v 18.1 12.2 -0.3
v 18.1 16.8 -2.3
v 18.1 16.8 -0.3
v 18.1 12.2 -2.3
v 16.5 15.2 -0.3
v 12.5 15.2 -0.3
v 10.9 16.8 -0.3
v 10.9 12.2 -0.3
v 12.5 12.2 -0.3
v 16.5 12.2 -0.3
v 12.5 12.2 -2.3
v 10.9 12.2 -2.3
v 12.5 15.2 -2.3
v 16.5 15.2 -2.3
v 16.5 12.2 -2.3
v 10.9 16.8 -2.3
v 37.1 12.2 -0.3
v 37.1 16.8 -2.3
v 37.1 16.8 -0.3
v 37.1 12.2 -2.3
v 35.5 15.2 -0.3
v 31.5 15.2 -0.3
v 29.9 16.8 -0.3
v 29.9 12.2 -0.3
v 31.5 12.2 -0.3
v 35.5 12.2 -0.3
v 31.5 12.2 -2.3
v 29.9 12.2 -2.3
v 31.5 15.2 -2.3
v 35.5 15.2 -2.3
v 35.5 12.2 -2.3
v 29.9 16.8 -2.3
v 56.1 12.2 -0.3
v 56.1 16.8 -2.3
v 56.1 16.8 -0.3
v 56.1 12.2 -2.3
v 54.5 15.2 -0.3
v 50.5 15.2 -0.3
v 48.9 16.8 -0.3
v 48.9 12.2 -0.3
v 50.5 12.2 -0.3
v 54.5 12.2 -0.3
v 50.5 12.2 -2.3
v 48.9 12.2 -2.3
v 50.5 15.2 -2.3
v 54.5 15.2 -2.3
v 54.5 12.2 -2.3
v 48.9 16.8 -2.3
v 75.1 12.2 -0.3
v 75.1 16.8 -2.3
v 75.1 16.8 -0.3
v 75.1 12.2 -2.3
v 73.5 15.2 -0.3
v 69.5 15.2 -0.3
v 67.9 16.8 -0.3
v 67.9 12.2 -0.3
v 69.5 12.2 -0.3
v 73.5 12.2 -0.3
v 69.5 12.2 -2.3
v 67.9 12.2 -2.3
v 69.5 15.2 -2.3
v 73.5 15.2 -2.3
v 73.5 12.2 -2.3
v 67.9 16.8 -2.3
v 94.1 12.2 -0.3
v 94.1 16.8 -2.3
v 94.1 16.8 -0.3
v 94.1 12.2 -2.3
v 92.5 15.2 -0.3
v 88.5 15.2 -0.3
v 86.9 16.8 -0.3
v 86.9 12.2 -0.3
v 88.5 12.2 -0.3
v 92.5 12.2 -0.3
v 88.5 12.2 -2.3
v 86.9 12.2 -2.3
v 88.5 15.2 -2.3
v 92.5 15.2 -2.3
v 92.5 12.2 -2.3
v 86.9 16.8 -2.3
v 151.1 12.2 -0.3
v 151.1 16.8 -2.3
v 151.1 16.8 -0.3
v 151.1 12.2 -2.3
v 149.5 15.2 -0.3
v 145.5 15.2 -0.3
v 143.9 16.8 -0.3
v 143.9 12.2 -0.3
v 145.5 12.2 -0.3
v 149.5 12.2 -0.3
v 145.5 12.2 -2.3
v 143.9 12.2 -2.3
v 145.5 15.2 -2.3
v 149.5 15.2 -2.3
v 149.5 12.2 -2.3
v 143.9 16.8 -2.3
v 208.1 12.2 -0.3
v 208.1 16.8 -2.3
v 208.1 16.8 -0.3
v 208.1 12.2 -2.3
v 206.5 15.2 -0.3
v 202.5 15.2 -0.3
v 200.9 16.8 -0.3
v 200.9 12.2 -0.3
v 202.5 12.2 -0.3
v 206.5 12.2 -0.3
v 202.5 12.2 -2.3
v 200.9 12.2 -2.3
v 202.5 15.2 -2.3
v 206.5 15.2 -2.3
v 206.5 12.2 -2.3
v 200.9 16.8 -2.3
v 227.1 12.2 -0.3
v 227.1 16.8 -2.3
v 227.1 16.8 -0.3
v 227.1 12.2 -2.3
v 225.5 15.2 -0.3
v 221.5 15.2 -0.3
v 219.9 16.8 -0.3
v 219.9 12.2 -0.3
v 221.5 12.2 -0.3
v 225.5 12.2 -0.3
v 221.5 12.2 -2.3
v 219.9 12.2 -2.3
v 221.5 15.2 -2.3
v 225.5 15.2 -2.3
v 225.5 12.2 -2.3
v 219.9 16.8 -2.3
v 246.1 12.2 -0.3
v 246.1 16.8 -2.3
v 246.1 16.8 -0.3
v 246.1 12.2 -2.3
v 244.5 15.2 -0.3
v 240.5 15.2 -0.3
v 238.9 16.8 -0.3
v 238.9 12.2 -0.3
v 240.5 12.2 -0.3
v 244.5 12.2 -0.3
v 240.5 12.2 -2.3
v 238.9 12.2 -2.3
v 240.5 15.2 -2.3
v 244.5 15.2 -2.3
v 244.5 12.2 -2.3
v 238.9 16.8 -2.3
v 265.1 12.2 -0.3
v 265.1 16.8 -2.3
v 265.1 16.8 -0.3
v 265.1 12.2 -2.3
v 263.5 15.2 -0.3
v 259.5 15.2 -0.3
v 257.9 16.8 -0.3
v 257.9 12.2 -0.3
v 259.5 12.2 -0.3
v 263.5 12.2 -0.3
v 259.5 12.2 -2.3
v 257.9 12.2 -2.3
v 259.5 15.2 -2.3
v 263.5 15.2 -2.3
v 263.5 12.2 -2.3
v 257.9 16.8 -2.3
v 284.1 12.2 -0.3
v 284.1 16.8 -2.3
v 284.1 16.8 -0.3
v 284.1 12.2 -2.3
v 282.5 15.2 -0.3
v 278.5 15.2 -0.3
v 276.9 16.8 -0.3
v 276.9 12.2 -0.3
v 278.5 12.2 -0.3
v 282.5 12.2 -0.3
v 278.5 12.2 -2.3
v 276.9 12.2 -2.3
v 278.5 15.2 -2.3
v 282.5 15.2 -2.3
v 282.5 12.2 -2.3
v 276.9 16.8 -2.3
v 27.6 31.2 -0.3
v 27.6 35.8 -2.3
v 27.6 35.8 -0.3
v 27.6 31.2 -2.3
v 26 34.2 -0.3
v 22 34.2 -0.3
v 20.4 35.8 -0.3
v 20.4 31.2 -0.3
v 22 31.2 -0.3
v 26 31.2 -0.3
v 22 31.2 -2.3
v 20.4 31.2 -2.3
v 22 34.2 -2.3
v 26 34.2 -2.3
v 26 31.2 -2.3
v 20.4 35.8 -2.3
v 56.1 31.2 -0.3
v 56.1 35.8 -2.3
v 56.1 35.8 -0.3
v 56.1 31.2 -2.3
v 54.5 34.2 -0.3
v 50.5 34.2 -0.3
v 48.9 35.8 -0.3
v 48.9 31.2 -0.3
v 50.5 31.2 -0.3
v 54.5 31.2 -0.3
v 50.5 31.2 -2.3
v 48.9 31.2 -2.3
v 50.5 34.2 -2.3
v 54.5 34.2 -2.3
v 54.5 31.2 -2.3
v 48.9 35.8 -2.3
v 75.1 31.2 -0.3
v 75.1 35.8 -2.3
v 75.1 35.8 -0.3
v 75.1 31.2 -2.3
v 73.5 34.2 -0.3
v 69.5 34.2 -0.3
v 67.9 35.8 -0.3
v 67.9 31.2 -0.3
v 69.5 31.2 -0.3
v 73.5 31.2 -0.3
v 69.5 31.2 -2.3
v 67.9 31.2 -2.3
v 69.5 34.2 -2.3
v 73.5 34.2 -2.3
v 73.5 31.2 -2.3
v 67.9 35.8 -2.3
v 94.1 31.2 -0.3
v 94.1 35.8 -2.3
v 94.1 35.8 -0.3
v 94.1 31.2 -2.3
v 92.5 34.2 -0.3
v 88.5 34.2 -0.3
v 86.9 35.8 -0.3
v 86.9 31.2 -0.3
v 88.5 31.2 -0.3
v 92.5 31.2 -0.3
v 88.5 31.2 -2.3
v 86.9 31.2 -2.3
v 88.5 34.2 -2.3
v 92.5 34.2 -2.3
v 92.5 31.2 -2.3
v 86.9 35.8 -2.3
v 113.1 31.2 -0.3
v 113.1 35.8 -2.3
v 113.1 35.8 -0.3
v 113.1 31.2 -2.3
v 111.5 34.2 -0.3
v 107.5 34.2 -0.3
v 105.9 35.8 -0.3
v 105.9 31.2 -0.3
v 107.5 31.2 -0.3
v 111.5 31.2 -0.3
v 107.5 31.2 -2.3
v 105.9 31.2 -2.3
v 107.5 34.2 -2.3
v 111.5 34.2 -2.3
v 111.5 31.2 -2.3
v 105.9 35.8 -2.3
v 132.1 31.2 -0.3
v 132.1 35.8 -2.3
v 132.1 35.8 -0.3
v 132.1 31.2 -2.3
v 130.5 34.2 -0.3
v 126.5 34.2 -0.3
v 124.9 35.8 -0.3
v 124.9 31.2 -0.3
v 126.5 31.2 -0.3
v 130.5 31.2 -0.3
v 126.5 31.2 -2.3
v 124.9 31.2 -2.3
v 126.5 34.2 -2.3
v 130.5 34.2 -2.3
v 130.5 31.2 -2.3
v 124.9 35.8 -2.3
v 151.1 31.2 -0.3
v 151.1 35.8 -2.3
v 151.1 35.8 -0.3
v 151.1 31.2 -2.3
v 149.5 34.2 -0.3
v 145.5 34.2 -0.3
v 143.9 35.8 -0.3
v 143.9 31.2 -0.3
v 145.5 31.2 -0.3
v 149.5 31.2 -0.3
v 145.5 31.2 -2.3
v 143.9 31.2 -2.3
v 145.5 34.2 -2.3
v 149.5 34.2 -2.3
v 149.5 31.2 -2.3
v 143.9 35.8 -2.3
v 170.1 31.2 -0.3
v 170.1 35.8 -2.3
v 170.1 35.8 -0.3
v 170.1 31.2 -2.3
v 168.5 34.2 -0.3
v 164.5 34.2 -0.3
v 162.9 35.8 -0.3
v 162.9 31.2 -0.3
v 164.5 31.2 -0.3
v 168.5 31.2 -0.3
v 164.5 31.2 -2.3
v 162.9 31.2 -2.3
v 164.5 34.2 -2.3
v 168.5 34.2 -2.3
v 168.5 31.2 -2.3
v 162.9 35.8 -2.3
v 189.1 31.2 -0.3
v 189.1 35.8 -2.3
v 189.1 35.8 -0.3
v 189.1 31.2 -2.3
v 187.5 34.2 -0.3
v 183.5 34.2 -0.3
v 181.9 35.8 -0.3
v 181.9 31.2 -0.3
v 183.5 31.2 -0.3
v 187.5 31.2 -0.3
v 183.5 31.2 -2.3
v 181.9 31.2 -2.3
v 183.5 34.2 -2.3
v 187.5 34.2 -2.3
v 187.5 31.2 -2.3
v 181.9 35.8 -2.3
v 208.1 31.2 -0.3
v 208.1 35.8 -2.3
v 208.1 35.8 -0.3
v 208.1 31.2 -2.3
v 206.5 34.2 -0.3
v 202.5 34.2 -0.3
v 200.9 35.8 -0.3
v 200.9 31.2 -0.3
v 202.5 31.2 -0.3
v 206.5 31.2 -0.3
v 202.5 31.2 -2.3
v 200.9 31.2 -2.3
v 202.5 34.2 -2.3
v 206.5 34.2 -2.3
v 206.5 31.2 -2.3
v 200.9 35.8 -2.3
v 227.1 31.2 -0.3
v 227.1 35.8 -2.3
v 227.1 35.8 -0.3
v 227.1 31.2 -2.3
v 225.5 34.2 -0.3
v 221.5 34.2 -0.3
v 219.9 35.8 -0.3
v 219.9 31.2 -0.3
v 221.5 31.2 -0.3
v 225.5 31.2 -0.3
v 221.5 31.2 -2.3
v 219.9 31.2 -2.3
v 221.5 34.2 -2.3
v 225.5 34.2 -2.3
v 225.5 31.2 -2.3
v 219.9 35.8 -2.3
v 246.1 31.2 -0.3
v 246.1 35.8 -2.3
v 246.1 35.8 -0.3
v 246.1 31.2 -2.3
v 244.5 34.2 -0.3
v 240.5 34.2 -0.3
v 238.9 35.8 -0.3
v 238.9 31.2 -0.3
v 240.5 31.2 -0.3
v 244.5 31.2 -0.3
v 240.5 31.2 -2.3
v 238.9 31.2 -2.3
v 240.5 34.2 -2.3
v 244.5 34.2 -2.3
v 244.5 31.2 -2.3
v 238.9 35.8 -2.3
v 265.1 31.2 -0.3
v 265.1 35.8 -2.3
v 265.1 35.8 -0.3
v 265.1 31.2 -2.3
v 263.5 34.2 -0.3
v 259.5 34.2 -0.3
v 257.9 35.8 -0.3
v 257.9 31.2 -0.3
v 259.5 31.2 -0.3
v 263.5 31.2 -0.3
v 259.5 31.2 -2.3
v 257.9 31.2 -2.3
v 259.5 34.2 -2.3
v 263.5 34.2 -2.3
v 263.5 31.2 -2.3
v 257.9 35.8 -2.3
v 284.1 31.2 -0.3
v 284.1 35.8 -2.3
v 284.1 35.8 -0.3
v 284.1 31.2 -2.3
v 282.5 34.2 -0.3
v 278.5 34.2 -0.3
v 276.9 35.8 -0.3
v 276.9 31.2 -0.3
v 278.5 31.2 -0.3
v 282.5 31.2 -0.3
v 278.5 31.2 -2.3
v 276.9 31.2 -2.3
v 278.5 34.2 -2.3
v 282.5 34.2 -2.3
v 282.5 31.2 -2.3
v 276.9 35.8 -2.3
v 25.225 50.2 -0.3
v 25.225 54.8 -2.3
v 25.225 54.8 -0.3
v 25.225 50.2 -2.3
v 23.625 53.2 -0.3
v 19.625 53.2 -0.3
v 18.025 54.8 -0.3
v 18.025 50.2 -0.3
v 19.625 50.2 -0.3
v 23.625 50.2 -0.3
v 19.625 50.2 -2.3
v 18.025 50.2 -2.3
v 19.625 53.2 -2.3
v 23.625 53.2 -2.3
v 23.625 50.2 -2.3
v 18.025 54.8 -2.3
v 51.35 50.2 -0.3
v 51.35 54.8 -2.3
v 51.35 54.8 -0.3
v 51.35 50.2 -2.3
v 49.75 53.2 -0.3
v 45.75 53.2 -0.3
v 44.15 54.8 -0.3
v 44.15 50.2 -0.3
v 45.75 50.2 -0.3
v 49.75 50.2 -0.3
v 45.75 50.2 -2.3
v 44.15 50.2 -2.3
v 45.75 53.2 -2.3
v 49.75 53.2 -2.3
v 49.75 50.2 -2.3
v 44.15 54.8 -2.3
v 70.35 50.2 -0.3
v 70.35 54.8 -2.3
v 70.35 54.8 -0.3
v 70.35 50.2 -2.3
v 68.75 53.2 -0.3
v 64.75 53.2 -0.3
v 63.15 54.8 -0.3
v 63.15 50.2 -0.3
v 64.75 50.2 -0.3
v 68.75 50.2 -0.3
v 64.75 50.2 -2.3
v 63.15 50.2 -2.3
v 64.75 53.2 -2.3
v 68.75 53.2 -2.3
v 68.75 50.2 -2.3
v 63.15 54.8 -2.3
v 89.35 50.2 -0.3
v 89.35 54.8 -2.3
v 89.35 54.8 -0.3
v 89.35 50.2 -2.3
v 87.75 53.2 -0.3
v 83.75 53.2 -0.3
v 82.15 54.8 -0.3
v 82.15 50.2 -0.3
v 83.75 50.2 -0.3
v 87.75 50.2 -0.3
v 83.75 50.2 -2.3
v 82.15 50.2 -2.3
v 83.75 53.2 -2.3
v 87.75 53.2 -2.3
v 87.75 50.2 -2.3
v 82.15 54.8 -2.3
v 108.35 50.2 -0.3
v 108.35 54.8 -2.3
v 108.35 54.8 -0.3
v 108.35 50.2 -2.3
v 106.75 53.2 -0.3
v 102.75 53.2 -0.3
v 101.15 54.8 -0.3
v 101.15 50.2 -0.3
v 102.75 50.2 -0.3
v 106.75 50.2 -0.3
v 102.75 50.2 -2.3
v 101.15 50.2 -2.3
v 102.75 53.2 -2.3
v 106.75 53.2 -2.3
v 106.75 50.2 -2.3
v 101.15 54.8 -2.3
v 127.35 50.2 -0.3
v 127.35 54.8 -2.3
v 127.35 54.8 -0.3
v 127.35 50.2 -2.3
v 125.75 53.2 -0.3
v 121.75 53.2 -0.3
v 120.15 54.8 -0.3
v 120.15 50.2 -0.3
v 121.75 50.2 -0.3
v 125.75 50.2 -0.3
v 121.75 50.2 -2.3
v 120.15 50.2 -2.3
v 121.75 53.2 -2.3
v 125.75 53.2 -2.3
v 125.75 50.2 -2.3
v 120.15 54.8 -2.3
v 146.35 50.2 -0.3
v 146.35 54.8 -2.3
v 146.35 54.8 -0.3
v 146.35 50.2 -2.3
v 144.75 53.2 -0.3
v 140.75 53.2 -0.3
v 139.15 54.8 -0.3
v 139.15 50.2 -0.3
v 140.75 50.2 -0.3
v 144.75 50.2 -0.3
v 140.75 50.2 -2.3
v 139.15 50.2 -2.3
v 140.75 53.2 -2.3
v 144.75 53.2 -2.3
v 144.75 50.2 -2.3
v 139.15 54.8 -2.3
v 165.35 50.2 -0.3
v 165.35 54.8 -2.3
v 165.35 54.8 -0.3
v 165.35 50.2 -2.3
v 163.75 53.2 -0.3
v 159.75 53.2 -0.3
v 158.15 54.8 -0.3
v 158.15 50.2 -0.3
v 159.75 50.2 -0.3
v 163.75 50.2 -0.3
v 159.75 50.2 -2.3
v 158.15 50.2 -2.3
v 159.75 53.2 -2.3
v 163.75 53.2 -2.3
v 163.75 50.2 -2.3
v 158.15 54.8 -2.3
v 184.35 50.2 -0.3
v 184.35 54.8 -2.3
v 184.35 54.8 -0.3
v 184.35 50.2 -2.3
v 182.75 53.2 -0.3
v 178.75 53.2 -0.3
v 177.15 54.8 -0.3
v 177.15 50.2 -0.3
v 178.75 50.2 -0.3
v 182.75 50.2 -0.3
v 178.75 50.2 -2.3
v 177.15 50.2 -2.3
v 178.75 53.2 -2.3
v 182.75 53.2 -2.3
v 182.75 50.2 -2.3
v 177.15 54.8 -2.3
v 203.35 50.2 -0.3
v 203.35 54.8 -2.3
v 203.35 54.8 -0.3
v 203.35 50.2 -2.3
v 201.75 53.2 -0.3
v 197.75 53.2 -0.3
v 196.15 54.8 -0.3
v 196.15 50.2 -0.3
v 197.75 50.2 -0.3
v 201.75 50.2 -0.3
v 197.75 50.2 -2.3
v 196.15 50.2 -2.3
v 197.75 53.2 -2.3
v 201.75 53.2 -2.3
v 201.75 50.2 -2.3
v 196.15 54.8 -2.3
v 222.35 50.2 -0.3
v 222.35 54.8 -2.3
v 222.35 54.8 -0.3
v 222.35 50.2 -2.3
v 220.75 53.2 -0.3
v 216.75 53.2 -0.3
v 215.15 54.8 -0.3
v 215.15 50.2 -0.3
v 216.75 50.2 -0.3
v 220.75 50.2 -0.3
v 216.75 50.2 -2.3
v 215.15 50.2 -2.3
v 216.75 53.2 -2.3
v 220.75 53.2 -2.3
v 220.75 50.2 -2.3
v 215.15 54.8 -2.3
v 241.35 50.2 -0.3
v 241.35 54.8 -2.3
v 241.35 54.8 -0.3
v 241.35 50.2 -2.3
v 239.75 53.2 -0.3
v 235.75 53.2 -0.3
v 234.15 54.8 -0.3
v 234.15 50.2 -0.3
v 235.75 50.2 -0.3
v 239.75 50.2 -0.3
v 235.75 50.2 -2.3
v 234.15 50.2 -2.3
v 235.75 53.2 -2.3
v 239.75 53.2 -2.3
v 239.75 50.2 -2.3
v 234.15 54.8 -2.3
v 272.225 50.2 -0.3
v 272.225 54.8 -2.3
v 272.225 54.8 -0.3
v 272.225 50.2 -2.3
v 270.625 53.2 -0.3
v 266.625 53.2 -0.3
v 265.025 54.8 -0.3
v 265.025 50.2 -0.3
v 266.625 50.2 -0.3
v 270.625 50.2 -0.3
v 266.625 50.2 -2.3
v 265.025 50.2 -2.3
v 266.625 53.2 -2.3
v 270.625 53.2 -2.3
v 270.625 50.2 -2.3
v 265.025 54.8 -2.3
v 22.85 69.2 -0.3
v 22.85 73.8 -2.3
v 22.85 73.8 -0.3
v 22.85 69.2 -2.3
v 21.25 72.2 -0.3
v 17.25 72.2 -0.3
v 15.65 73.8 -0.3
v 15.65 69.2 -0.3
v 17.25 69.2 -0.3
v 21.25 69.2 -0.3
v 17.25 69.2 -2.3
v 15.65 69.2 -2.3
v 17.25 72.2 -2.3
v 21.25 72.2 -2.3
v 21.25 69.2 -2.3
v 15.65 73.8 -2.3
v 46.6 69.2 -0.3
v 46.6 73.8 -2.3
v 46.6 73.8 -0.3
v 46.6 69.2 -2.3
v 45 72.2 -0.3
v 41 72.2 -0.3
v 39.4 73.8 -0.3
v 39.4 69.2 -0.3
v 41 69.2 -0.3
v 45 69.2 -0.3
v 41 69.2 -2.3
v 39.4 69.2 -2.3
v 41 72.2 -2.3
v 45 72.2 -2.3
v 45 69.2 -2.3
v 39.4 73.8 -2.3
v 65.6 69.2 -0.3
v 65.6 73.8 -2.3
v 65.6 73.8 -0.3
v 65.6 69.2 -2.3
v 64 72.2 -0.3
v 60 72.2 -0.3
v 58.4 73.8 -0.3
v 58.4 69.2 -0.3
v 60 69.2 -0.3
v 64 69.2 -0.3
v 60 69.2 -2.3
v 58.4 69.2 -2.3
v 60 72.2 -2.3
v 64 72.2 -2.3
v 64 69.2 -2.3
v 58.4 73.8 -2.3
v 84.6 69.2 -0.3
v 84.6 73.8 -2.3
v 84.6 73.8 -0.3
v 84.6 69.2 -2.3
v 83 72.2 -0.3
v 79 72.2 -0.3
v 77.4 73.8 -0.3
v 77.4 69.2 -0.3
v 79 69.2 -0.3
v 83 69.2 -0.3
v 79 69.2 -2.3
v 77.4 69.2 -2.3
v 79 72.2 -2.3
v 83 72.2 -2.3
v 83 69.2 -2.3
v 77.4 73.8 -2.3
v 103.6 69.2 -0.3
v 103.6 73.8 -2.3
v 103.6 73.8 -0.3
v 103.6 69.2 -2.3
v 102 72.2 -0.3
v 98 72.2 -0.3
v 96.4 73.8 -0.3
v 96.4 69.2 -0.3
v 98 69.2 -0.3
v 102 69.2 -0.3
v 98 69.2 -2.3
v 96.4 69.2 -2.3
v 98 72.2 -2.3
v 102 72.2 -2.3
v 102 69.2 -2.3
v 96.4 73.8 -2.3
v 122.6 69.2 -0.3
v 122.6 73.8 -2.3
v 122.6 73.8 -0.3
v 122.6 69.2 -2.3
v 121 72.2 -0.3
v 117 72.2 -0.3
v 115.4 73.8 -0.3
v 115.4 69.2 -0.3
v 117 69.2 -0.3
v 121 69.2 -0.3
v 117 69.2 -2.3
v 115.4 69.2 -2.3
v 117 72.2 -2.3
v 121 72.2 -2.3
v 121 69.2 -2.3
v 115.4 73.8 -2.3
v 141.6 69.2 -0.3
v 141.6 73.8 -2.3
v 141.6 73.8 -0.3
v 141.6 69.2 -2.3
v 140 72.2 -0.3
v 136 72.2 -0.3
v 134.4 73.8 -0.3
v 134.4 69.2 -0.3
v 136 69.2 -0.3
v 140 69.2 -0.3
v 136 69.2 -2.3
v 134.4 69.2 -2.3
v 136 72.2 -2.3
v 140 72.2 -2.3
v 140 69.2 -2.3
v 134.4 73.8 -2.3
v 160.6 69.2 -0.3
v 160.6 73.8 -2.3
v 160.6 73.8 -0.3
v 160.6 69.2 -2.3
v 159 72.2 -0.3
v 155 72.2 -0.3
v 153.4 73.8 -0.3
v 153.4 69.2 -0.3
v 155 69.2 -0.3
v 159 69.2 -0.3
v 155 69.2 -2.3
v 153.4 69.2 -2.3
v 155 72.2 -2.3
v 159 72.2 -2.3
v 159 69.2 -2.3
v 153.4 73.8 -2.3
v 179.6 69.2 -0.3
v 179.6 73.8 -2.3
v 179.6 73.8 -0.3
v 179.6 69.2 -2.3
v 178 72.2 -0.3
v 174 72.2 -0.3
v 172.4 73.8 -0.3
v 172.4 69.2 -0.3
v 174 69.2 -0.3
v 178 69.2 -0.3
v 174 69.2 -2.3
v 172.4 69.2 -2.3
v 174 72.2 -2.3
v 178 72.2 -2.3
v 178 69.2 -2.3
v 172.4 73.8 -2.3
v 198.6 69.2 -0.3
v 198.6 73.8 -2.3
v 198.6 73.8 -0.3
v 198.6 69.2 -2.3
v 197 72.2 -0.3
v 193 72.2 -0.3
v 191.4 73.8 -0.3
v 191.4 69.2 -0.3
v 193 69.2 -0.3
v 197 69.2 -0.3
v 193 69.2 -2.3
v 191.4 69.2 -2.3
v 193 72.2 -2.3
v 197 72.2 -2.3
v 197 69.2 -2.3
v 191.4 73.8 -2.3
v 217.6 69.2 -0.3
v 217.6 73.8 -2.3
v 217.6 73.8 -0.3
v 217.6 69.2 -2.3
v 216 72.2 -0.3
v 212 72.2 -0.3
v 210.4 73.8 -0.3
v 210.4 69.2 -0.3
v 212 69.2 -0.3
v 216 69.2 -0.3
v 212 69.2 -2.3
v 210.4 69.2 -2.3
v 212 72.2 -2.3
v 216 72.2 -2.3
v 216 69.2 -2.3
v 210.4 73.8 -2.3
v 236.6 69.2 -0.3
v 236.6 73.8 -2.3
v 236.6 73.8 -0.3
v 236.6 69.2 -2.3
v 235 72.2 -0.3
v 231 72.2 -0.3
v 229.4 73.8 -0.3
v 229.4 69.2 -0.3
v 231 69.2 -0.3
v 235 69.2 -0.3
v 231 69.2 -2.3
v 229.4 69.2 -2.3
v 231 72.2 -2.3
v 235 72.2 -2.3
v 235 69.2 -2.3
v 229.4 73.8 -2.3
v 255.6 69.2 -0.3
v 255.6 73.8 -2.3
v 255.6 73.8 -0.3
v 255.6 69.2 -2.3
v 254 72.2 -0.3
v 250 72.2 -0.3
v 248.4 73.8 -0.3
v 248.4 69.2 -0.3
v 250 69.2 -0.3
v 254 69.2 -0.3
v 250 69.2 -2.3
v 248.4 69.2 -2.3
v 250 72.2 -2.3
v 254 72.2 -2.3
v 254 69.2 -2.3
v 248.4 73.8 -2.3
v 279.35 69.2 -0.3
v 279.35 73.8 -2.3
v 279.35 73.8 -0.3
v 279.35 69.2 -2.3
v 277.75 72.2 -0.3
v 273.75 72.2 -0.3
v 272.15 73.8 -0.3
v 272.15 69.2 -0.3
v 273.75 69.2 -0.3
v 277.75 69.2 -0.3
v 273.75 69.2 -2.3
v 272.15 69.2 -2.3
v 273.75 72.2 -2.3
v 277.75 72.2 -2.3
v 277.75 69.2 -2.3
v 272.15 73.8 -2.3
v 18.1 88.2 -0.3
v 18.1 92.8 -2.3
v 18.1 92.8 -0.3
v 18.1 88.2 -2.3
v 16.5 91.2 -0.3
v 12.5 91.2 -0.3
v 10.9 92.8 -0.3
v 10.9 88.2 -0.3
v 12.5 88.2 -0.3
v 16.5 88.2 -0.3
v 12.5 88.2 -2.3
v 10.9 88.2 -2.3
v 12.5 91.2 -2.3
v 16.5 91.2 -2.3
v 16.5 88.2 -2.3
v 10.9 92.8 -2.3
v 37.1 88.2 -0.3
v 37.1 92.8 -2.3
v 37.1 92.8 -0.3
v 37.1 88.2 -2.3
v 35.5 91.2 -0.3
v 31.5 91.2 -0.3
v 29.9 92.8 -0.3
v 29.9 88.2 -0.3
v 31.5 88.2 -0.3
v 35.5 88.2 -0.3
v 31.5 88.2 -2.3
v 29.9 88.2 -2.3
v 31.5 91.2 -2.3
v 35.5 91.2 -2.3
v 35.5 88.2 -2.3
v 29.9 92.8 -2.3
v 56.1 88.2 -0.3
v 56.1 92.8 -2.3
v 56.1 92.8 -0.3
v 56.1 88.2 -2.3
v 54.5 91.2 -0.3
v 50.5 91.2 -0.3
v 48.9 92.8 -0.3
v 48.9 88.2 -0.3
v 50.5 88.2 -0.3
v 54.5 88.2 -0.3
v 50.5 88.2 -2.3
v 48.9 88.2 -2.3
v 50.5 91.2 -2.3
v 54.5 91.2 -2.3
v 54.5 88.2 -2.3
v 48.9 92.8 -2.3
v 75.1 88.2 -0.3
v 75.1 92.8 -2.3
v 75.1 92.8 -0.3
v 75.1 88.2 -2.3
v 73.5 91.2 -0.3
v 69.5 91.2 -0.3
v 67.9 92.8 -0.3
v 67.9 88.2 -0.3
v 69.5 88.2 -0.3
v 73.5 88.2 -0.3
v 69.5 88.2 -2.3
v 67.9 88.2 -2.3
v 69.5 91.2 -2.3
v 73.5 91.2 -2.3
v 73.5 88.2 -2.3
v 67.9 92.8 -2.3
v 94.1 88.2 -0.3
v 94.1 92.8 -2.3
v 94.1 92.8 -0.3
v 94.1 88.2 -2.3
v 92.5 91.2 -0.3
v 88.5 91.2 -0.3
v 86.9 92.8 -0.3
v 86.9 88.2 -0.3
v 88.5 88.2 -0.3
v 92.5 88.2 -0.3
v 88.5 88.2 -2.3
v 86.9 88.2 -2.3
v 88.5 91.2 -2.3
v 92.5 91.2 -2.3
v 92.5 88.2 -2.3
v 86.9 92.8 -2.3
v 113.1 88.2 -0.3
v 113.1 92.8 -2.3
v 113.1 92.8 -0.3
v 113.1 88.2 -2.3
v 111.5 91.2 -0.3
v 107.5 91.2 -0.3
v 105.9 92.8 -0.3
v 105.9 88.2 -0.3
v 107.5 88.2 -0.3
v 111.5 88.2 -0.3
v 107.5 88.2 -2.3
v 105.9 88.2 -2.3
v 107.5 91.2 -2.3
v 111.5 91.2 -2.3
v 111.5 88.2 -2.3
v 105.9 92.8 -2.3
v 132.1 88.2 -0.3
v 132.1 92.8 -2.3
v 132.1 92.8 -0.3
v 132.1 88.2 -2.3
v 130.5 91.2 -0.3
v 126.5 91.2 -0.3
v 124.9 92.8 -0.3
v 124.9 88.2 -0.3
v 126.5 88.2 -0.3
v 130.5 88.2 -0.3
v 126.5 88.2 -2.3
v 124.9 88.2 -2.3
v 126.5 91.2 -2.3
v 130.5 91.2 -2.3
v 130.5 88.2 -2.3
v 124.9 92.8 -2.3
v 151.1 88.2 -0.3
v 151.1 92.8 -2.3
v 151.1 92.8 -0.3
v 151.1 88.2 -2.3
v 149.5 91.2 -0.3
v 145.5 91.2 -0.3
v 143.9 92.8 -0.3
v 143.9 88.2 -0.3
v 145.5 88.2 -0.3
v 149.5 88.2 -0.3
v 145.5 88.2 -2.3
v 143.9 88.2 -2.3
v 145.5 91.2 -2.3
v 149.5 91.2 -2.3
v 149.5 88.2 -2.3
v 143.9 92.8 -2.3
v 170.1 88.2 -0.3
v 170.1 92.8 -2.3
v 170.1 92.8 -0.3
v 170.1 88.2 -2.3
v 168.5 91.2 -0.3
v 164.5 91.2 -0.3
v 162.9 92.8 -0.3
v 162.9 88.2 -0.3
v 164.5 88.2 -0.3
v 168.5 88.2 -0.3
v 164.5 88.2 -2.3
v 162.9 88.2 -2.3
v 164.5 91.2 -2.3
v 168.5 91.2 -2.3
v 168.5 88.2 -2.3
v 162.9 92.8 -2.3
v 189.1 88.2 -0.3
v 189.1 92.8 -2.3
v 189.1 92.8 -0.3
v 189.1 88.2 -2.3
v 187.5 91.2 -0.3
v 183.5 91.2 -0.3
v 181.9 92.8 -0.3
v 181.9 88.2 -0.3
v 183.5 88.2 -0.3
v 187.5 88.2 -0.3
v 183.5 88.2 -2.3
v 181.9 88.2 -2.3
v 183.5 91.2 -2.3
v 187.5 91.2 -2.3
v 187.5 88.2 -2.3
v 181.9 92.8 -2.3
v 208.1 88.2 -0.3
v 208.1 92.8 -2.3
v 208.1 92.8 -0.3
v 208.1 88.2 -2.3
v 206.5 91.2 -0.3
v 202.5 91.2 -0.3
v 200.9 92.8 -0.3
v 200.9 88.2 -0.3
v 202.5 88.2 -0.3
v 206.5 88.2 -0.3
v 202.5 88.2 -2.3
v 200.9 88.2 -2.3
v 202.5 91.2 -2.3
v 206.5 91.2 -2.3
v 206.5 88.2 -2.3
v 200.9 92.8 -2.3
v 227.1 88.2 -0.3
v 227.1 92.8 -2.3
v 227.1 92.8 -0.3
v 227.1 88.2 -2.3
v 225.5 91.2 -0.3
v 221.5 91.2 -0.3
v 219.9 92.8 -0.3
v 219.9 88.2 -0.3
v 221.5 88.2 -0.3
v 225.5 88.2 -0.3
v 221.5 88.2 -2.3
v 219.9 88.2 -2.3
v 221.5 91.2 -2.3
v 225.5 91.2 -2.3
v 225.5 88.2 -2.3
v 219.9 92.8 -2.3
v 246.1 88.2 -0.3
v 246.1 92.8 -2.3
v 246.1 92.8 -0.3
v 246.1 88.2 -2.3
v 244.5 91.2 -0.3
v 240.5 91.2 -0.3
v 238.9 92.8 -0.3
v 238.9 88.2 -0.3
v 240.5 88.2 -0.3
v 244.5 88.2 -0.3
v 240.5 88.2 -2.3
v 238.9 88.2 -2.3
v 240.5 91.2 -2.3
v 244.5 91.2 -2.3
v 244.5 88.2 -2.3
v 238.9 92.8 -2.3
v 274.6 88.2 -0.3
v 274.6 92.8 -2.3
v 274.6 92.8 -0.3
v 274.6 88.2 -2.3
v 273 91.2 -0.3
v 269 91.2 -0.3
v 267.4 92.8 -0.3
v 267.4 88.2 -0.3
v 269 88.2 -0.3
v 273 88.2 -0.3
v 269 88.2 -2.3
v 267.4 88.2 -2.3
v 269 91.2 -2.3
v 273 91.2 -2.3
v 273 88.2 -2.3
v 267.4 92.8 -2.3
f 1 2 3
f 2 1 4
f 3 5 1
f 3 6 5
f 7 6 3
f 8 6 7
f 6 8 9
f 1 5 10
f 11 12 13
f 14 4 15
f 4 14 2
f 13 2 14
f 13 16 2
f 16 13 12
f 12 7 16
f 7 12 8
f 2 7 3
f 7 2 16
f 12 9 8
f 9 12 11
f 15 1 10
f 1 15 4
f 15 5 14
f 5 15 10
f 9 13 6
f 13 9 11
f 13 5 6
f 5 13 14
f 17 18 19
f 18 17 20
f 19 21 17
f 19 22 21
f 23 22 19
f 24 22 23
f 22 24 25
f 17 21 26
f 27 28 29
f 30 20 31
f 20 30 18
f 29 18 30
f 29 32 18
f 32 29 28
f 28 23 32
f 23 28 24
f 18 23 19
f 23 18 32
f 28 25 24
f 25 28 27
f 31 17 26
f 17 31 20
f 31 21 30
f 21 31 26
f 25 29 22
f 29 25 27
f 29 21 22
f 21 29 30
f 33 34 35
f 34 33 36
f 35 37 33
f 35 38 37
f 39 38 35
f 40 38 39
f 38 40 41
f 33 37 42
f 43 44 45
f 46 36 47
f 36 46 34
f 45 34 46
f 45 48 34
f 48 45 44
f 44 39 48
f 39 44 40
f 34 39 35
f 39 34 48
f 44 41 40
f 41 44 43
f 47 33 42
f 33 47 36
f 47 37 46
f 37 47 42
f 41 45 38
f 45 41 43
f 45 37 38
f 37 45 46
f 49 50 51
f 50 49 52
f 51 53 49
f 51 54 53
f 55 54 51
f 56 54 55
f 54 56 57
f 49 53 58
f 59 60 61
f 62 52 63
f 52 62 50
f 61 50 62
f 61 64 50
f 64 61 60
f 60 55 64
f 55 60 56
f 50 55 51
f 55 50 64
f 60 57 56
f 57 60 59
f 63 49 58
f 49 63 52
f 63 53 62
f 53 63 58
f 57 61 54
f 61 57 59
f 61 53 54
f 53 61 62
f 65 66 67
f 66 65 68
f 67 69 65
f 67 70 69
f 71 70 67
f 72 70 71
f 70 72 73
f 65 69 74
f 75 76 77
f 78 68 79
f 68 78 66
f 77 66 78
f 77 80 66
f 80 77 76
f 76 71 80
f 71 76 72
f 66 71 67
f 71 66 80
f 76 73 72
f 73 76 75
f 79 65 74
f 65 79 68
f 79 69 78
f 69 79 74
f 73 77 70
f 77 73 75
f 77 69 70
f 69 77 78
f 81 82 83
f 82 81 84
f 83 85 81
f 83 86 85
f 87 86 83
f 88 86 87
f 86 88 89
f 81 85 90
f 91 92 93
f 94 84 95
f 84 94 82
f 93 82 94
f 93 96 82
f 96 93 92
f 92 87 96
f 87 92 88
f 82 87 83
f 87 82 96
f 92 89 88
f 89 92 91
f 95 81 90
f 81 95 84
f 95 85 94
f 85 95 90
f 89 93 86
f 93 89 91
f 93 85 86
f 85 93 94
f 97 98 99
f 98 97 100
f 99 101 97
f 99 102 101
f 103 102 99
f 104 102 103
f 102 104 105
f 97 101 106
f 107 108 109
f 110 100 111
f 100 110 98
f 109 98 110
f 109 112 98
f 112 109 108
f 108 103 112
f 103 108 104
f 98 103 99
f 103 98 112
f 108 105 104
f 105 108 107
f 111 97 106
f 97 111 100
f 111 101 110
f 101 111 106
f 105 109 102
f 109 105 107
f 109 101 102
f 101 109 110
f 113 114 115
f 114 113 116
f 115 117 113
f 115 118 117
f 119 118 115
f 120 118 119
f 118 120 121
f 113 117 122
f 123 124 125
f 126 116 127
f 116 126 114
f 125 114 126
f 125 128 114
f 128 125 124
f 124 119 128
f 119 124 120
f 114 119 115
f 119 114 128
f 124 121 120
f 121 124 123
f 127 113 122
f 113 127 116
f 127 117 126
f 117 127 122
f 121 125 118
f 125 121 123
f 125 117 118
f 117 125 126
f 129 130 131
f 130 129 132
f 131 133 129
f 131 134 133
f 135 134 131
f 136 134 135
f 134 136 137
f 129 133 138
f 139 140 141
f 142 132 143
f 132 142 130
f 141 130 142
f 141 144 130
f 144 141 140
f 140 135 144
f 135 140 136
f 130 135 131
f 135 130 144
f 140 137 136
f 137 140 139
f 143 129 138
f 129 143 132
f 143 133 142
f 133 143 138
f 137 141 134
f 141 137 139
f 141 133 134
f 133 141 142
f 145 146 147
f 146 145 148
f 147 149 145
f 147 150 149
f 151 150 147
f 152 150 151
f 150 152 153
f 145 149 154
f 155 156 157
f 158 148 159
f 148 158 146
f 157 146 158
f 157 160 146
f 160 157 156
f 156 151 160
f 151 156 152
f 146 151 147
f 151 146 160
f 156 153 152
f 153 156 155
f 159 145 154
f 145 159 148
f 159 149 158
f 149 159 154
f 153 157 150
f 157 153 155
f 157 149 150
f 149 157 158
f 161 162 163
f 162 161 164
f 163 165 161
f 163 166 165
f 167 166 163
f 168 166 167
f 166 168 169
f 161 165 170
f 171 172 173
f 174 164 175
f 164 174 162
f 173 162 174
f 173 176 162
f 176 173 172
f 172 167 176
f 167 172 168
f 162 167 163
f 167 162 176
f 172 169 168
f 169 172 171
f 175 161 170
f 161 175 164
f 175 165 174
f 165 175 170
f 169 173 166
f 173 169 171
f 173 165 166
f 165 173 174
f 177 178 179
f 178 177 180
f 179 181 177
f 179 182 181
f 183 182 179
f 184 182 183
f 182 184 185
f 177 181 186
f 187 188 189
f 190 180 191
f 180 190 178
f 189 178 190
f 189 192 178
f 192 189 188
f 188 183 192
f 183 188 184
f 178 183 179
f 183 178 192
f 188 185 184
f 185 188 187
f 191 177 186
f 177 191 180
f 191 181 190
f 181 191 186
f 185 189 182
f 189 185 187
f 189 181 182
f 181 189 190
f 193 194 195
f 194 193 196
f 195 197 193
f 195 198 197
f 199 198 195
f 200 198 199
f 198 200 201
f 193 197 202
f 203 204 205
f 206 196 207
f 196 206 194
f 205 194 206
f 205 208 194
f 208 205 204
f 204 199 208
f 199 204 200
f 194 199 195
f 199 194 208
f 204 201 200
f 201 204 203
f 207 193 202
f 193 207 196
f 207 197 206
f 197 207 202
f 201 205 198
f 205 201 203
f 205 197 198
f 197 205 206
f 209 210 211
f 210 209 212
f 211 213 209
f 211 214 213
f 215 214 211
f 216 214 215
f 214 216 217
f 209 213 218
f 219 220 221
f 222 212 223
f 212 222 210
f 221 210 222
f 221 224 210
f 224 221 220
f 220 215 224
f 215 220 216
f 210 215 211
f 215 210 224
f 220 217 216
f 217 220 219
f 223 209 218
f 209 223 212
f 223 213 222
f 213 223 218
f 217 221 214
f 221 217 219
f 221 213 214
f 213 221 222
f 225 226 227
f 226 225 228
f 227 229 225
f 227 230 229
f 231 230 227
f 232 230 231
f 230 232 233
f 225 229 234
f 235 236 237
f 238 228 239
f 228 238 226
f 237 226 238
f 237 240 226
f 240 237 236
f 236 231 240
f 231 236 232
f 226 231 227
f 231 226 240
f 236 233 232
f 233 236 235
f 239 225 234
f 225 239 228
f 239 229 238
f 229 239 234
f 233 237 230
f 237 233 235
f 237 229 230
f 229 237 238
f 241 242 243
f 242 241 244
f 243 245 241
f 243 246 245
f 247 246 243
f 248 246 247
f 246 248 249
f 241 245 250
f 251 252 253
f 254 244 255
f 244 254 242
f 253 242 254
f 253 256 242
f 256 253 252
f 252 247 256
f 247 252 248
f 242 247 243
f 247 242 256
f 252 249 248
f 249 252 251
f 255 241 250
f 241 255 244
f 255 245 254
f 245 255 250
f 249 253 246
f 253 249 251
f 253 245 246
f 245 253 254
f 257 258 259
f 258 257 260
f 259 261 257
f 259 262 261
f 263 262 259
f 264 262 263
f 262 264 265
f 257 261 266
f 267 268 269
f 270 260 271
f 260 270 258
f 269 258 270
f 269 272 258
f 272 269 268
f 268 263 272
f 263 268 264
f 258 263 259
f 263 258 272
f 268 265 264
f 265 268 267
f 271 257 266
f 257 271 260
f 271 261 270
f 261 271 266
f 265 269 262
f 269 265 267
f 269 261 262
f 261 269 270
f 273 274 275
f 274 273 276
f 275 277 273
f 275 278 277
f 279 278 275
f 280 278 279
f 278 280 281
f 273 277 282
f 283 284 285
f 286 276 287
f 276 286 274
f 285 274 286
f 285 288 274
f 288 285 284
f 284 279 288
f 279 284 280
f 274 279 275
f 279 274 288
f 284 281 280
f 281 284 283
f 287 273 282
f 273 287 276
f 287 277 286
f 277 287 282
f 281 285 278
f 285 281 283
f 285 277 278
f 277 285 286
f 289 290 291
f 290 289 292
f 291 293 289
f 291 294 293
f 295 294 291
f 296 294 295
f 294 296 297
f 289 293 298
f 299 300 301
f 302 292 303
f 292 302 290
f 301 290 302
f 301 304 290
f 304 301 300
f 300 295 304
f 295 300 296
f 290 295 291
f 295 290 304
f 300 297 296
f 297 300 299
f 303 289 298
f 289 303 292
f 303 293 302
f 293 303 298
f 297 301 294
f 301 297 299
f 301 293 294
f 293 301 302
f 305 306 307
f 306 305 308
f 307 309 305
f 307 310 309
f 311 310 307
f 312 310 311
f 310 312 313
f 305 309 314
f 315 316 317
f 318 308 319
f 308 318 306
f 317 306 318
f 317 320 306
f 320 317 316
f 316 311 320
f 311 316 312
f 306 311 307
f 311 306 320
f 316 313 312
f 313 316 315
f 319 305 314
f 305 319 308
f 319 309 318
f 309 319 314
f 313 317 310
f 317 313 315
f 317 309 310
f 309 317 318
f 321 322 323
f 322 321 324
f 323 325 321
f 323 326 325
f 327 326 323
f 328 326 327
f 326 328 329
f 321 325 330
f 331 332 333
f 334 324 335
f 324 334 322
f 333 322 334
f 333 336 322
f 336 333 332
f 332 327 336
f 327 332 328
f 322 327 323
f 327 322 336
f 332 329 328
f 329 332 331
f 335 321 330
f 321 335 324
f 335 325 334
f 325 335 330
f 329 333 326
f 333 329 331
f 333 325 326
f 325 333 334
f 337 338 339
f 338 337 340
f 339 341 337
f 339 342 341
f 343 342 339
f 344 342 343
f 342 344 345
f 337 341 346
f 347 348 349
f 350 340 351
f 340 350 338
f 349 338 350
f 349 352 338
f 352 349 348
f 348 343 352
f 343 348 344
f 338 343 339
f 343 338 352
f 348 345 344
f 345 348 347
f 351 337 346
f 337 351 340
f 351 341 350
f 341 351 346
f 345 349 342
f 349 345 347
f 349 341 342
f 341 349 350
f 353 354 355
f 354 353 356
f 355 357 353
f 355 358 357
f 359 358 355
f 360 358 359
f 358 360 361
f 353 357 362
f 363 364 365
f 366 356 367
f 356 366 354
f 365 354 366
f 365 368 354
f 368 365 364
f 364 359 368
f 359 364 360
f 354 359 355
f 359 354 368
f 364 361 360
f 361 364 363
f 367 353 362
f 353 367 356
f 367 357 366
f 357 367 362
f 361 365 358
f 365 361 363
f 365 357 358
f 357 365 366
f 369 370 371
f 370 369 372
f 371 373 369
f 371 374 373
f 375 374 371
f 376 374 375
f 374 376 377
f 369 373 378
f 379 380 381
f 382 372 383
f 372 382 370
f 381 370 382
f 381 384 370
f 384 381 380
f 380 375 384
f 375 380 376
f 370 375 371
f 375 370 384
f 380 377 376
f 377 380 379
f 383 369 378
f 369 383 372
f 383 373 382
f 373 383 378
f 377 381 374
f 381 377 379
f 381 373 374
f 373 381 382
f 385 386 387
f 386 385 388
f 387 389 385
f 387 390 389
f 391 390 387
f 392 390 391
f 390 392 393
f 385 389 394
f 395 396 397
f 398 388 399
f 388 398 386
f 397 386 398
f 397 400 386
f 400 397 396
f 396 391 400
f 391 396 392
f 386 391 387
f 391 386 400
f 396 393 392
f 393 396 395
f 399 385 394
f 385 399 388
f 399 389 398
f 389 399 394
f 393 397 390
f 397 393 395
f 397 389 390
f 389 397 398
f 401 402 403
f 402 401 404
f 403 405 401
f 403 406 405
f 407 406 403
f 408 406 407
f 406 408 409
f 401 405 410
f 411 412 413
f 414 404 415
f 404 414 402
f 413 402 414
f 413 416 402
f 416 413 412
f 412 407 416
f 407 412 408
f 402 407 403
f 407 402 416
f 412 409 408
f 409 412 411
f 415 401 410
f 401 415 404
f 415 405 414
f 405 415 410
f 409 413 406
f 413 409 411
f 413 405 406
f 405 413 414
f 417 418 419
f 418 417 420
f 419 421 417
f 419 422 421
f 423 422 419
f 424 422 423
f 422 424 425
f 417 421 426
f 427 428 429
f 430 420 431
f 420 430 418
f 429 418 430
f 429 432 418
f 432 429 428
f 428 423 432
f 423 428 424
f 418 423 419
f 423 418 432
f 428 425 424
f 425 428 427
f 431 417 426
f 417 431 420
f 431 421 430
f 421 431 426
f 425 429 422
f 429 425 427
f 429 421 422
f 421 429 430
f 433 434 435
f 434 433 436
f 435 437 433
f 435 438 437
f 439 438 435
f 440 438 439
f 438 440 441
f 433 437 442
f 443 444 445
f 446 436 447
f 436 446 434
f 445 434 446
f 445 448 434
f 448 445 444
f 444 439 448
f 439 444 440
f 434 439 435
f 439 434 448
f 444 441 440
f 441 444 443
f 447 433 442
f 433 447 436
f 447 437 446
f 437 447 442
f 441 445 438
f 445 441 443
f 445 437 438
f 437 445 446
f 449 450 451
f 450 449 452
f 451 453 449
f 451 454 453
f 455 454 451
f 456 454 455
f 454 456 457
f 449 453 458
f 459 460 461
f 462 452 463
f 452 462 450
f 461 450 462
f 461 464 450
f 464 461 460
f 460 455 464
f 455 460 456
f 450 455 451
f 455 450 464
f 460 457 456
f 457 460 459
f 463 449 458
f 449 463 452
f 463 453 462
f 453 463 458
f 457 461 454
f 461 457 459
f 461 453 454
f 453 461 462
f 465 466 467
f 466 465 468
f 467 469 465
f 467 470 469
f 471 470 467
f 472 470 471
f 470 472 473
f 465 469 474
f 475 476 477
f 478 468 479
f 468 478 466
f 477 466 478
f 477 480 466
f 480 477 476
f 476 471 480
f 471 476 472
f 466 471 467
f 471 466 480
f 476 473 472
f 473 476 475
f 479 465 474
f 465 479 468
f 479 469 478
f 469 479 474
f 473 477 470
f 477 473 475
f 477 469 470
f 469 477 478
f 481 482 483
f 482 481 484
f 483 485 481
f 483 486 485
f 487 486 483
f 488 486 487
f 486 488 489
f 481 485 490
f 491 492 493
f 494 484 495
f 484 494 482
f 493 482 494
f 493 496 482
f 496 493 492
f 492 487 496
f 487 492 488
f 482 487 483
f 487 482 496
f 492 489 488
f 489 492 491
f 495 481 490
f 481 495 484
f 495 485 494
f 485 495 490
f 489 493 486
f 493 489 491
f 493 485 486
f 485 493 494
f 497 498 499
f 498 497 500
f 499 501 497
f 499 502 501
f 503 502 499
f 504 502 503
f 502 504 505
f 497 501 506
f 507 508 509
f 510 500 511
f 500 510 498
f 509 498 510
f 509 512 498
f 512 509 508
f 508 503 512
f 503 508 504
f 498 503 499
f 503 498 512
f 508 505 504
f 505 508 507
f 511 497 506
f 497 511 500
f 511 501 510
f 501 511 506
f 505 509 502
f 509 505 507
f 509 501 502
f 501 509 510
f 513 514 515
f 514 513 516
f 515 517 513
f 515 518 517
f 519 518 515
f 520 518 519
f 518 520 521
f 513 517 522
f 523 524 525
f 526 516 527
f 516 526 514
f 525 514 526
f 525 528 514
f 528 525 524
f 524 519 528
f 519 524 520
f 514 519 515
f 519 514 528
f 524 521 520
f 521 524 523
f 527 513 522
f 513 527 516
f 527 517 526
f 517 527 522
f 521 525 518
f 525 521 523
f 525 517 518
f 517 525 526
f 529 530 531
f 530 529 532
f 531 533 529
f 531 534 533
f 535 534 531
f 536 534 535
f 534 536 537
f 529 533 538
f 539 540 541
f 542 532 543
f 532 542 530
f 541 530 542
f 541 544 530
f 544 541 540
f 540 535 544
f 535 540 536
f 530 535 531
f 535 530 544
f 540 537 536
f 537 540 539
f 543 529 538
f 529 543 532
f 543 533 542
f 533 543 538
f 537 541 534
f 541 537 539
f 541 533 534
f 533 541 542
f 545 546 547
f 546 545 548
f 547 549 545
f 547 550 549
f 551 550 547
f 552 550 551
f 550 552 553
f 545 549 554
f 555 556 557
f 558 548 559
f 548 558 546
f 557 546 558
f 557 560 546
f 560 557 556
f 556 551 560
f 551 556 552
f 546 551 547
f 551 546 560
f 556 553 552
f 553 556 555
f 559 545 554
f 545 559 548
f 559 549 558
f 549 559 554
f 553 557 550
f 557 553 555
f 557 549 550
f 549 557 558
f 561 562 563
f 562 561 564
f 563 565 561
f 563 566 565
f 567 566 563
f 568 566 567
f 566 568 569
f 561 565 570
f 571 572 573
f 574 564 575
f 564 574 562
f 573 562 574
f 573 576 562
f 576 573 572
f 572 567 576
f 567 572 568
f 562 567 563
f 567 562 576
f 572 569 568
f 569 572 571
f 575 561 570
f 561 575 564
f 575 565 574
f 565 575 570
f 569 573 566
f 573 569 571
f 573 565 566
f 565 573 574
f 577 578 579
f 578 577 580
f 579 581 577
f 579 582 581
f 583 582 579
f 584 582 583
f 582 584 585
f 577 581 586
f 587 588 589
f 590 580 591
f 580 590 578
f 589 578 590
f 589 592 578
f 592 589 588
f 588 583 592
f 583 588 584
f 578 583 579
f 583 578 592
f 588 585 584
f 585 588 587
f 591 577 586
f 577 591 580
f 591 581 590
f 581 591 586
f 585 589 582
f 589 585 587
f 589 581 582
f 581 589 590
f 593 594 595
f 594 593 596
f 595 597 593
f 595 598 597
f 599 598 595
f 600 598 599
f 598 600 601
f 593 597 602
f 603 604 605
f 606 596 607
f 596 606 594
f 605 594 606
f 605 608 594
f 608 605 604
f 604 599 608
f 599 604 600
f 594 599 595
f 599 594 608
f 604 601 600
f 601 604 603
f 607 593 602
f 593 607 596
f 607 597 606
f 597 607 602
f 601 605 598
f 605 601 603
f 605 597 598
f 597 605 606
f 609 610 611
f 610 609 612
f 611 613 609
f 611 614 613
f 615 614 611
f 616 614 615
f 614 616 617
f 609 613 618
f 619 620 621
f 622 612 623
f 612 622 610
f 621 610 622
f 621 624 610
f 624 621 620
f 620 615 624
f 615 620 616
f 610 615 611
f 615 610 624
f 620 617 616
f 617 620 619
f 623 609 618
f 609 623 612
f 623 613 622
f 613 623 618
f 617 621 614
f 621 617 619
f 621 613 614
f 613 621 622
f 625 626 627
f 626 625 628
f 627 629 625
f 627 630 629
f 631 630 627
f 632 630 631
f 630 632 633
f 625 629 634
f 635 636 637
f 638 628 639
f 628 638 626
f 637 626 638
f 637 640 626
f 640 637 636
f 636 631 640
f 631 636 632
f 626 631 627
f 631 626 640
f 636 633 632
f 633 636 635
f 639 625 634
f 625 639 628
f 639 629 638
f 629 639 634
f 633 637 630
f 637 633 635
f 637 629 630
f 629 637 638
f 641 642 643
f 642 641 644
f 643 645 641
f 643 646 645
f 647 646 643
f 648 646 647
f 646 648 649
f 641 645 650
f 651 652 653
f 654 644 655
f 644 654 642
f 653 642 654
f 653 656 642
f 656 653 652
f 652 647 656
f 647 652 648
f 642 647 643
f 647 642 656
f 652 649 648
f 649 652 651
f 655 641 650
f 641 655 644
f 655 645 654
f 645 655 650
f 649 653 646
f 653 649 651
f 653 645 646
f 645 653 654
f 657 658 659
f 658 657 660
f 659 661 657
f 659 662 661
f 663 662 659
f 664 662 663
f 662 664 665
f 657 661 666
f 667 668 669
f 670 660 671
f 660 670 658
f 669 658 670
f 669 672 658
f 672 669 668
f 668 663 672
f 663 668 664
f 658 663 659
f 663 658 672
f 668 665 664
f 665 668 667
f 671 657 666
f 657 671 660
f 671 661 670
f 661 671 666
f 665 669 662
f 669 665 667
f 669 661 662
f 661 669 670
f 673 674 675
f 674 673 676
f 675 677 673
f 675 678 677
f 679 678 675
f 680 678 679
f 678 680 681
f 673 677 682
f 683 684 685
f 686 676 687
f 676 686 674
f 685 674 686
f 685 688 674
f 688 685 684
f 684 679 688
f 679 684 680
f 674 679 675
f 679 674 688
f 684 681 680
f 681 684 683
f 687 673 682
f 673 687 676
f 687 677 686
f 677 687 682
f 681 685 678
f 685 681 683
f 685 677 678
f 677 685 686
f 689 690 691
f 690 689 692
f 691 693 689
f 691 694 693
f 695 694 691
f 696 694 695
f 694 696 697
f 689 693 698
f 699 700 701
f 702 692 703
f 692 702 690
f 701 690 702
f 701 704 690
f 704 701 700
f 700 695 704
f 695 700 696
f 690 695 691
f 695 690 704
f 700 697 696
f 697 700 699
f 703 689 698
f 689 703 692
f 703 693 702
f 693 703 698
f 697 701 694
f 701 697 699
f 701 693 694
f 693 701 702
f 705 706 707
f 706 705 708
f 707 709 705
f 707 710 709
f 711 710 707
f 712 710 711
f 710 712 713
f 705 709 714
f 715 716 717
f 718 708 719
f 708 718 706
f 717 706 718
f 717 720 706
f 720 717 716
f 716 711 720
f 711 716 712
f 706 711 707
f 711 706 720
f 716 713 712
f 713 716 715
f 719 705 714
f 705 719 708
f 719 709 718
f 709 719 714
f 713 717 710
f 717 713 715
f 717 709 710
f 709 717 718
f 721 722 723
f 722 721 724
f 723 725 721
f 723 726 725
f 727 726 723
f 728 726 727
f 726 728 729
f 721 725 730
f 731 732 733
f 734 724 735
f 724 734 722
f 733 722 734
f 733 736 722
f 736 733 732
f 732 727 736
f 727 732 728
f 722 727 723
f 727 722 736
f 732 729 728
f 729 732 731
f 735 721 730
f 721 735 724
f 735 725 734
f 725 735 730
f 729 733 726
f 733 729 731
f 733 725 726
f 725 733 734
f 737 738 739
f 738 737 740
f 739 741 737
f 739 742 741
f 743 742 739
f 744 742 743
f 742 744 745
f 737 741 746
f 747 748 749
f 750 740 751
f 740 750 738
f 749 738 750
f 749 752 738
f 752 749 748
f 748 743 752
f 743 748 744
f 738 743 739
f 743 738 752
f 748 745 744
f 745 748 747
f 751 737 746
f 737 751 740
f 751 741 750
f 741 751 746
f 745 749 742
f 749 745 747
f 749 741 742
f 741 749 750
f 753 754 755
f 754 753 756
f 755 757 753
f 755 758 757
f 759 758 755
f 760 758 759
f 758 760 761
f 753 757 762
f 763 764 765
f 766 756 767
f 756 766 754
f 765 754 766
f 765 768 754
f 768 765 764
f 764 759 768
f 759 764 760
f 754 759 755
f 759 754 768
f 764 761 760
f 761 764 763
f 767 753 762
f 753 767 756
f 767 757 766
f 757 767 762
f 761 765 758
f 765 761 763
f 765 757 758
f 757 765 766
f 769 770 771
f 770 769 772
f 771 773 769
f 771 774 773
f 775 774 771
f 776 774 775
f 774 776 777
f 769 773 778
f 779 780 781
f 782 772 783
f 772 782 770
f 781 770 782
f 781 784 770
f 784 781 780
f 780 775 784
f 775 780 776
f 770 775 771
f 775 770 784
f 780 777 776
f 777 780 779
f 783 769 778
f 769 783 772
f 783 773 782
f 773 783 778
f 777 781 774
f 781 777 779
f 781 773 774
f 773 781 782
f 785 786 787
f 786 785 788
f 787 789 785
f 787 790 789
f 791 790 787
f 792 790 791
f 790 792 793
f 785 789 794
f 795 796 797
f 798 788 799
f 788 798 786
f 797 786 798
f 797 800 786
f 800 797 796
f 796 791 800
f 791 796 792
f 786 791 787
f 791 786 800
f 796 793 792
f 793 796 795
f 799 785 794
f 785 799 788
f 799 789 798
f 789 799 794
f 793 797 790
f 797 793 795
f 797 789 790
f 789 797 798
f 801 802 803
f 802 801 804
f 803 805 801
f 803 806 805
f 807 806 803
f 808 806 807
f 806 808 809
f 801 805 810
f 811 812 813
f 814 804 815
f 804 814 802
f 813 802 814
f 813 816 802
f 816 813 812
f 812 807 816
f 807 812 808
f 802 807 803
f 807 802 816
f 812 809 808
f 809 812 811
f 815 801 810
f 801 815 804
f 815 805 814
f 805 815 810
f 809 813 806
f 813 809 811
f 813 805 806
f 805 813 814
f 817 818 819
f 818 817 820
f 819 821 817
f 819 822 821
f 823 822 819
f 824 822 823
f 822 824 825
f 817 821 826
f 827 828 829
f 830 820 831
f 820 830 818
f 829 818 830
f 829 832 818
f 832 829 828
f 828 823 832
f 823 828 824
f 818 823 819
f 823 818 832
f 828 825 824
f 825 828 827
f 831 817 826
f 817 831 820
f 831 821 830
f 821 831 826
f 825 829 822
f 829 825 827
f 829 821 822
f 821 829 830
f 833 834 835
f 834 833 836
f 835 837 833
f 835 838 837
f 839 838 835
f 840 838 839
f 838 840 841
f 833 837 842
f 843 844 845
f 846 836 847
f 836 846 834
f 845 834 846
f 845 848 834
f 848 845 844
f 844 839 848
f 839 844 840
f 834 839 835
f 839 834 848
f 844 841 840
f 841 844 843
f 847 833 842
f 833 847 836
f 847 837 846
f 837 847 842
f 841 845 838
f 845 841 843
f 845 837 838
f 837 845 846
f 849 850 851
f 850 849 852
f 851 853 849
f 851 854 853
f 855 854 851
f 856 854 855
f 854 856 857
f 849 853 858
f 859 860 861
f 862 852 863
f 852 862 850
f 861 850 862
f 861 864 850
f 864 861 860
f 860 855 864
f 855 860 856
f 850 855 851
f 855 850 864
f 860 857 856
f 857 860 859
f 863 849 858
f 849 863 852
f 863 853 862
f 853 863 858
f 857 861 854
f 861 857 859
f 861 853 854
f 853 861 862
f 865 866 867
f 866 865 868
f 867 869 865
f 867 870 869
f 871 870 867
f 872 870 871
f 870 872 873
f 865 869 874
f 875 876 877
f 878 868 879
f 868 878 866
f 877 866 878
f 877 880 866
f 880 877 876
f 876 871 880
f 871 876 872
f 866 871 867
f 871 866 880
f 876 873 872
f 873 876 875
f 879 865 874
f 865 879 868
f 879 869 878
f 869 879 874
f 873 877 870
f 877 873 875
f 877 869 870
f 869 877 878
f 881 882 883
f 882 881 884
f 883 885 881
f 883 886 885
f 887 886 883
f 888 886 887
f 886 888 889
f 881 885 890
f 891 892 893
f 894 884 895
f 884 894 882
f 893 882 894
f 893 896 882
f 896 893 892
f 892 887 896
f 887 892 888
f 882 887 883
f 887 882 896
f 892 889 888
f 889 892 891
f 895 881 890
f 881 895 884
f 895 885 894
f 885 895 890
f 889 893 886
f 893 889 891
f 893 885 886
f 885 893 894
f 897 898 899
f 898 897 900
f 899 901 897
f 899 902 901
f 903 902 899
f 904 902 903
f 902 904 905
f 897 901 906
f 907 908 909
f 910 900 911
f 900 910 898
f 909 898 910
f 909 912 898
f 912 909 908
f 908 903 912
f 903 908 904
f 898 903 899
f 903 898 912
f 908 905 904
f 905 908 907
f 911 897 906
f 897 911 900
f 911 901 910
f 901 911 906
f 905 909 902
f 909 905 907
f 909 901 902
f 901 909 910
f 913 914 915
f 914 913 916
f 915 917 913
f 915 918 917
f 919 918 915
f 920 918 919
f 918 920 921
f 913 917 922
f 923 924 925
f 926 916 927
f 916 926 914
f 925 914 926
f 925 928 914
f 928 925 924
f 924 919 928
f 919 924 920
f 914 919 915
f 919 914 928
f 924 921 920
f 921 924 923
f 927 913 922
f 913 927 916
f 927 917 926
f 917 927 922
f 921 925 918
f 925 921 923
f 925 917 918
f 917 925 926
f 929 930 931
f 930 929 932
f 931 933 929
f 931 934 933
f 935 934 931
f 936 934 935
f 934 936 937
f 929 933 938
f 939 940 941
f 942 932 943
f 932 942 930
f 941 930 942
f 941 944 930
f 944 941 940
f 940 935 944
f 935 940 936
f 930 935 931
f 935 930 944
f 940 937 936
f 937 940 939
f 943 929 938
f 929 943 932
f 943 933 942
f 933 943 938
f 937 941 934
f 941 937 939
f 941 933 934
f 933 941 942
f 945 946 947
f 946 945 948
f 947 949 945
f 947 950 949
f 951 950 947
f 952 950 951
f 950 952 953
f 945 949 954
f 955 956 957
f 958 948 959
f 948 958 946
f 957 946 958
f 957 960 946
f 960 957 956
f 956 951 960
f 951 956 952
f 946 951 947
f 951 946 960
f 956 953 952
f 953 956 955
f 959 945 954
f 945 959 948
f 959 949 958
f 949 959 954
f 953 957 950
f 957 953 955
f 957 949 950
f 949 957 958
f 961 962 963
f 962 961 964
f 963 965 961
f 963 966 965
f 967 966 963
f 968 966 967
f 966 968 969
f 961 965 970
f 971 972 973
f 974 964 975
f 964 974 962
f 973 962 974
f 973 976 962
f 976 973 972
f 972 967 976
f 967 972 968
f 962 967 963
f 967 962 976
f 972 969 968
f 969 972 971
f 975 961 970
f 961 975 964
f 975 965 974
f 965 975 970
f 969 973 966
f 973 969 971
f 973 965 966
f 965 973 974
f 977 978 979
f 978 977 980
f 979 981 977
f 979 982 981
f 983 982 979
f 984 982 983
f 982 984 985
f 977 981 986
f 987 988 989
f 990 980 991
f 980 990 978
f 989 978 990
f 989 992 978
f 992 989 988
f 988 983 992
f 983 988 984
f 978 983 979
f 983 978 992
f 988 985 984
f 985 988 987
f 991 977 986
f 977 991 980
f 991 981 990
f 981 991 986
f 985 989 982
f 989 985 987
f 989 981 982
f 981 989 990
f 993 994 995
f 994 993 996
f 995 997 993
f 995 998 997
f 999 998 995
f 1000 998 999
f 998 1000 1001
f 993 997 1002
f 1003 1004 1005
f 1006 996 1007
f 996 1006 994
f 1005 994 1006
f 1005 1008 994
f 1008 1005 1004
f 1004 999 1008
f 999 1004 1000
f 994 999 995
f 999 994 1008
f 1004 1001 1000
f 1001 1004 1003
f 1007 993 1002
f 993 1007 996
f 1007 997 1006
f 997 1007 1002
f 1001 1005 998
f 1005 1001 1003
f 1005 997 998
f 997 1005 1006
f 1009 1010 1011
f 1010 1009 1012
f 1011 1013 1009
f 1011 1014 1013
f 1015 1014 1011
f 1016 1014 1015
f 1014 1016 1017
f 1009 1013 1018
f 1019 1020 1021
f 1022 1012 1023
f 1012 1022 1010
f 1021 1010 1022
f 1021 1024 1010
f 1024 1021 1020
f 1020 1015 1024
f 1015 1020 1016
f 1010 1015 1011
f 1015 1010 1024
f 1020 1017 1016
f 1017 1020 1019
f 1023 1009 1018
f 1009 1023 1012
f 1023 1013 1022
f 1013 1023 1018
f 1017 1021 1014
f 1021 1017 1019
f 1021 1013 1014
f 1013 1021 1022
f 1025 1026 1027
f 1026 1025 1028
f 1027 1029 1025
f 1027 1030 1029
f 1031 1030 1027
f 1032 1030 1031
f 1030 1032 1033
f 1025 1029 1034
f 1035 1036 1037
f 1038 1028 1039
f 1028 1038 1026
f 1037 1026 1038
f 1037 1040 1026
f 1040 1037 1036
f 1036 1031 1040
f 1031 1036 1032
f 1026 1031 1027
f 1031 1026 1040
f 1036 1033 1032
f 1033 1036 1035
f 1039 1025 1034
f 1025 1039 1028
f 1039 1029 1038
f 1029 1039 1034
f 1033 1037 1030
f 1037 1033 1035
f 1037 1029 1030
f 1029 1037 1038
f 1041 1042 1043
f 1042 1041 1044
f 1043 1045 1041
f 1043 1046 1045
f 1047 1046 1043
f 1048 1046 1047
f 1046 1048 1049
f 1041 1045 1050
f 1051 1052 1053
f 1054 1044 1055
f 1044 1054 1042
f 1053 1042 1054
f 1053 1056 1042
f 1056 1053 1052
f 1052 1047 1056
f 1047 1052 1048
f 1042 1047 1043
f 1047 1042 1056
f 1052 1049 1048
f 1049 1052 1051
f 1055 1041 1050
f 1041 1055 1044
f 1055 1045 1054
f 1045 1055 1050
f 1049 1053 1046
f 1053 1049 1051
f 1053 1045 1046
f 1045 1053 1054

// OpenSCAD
// file: util.scad
function sumTo(list, end, index = 0, accum = 0) =
  (index < len(list) && index < end + 1) ?
    sumTo(list, end, index + 1, accum + list[index]) :
    accum;
// main file
include <util.scad>

$fn = 8;

// 4x4
//rows = [
//  [1, 1, 1, 1],
//  [1, 1, 1, 1],
//  [1, 1, 1, 1],
//  [1, 1, 1, 1],
//];

//
// 65%
rows = [
  [1, 1, 1, 1, 1, 5, 1, 1, 1, 1, 1],
  [2, 1, 1, 1, 1, 1, 1, 1, 1, 1, 1, 1, 1, 1],
  [1.75, 1, 1, 1, 1, 1, 1, 1, 1, 1, 1, 1, 2.25],
  [1.5, 1, 1, 1, 1, 1, 1, 1, 1, 1, 1, 1, 1, 1.5],
  [1, 1, 1, 1, 1, 1, 1, 1, 1, 1, 1, 1, 1, 2],
];

// a3144
sensorDimensions = [4, 3, 2]; 
sensorWireDimensions = [8, .2];

rowDepth = 19;
baseColumnWidth = 19;

sensorOffset = [5, 5];

plateMargin = 4;
plateHeight = .6;

scaffoldWidth = 1.6;

module SensorWire() {
  rotate([90, 0 ,0])
    cylinder(sensorWireDimensions[0], sensorWireDimensions[1], sensorWireDimensions[1], true);
};

module Sensor() {
  union() {
    cube(sensorDimensions, true);
    translate([0, -(sensorDimensions[1] + sensorWireDimensions[0]) / 2, 0]) {
      translate([-sensorWireDimensions[1] * 4, 0, 0])
        SensorWire();
      SensorWire();
      translate([sensorWireDimensions[1] * 4, 0, 0])
        SensorWire();
    }
  }
};

module Cell(width) {
  union() {
//    cube([width, rowDepth, plateHeight], true); // for debug
    translate([sensorOffset[0], sensorOffset[1], -(plateHeight + sensorDimensions[2]) / 2])
    difference() {
      cube([sensorDimensions[0] + 2 * scaffoldWidth, sensorDimensions[1] + scaffoldWidth, sensorDimensions[2]], true);
      translate([0, -scaffoldWidth, 0])
        cube([sensorDimensions[0], sensorDimensions[1] + scaffoldWidth, sensorDimensions[2] + 1], true);
    }
    // for debug
//    translate([sensorOffset[0], sensorOffset[1] - scaffoldWidth / 2, -(plateHeight + sensorDimensions[2]) / 2])
//    color([1,0,0])
//      Sensor();
  }
};

for(rowIndex = [0 : len(rows) - 1])
  let(rowOffset = (rowIndex + 1) * rowDepth) {
    for(colIndex = [0 : len(rows[rowIndex]) - 1])
      let(colOffset = baseColumnWidth * sumTo(rows[rowIndex], colIndex)) {
        translate([colOffset - baseColumnWidth * rows[rowIndex][colIndex] / 2, rowOffset - rowDepth / 2, 0])
          Cell(baseColumnWidth * rows[rowIndex][colIndex]);
      }    
  }
